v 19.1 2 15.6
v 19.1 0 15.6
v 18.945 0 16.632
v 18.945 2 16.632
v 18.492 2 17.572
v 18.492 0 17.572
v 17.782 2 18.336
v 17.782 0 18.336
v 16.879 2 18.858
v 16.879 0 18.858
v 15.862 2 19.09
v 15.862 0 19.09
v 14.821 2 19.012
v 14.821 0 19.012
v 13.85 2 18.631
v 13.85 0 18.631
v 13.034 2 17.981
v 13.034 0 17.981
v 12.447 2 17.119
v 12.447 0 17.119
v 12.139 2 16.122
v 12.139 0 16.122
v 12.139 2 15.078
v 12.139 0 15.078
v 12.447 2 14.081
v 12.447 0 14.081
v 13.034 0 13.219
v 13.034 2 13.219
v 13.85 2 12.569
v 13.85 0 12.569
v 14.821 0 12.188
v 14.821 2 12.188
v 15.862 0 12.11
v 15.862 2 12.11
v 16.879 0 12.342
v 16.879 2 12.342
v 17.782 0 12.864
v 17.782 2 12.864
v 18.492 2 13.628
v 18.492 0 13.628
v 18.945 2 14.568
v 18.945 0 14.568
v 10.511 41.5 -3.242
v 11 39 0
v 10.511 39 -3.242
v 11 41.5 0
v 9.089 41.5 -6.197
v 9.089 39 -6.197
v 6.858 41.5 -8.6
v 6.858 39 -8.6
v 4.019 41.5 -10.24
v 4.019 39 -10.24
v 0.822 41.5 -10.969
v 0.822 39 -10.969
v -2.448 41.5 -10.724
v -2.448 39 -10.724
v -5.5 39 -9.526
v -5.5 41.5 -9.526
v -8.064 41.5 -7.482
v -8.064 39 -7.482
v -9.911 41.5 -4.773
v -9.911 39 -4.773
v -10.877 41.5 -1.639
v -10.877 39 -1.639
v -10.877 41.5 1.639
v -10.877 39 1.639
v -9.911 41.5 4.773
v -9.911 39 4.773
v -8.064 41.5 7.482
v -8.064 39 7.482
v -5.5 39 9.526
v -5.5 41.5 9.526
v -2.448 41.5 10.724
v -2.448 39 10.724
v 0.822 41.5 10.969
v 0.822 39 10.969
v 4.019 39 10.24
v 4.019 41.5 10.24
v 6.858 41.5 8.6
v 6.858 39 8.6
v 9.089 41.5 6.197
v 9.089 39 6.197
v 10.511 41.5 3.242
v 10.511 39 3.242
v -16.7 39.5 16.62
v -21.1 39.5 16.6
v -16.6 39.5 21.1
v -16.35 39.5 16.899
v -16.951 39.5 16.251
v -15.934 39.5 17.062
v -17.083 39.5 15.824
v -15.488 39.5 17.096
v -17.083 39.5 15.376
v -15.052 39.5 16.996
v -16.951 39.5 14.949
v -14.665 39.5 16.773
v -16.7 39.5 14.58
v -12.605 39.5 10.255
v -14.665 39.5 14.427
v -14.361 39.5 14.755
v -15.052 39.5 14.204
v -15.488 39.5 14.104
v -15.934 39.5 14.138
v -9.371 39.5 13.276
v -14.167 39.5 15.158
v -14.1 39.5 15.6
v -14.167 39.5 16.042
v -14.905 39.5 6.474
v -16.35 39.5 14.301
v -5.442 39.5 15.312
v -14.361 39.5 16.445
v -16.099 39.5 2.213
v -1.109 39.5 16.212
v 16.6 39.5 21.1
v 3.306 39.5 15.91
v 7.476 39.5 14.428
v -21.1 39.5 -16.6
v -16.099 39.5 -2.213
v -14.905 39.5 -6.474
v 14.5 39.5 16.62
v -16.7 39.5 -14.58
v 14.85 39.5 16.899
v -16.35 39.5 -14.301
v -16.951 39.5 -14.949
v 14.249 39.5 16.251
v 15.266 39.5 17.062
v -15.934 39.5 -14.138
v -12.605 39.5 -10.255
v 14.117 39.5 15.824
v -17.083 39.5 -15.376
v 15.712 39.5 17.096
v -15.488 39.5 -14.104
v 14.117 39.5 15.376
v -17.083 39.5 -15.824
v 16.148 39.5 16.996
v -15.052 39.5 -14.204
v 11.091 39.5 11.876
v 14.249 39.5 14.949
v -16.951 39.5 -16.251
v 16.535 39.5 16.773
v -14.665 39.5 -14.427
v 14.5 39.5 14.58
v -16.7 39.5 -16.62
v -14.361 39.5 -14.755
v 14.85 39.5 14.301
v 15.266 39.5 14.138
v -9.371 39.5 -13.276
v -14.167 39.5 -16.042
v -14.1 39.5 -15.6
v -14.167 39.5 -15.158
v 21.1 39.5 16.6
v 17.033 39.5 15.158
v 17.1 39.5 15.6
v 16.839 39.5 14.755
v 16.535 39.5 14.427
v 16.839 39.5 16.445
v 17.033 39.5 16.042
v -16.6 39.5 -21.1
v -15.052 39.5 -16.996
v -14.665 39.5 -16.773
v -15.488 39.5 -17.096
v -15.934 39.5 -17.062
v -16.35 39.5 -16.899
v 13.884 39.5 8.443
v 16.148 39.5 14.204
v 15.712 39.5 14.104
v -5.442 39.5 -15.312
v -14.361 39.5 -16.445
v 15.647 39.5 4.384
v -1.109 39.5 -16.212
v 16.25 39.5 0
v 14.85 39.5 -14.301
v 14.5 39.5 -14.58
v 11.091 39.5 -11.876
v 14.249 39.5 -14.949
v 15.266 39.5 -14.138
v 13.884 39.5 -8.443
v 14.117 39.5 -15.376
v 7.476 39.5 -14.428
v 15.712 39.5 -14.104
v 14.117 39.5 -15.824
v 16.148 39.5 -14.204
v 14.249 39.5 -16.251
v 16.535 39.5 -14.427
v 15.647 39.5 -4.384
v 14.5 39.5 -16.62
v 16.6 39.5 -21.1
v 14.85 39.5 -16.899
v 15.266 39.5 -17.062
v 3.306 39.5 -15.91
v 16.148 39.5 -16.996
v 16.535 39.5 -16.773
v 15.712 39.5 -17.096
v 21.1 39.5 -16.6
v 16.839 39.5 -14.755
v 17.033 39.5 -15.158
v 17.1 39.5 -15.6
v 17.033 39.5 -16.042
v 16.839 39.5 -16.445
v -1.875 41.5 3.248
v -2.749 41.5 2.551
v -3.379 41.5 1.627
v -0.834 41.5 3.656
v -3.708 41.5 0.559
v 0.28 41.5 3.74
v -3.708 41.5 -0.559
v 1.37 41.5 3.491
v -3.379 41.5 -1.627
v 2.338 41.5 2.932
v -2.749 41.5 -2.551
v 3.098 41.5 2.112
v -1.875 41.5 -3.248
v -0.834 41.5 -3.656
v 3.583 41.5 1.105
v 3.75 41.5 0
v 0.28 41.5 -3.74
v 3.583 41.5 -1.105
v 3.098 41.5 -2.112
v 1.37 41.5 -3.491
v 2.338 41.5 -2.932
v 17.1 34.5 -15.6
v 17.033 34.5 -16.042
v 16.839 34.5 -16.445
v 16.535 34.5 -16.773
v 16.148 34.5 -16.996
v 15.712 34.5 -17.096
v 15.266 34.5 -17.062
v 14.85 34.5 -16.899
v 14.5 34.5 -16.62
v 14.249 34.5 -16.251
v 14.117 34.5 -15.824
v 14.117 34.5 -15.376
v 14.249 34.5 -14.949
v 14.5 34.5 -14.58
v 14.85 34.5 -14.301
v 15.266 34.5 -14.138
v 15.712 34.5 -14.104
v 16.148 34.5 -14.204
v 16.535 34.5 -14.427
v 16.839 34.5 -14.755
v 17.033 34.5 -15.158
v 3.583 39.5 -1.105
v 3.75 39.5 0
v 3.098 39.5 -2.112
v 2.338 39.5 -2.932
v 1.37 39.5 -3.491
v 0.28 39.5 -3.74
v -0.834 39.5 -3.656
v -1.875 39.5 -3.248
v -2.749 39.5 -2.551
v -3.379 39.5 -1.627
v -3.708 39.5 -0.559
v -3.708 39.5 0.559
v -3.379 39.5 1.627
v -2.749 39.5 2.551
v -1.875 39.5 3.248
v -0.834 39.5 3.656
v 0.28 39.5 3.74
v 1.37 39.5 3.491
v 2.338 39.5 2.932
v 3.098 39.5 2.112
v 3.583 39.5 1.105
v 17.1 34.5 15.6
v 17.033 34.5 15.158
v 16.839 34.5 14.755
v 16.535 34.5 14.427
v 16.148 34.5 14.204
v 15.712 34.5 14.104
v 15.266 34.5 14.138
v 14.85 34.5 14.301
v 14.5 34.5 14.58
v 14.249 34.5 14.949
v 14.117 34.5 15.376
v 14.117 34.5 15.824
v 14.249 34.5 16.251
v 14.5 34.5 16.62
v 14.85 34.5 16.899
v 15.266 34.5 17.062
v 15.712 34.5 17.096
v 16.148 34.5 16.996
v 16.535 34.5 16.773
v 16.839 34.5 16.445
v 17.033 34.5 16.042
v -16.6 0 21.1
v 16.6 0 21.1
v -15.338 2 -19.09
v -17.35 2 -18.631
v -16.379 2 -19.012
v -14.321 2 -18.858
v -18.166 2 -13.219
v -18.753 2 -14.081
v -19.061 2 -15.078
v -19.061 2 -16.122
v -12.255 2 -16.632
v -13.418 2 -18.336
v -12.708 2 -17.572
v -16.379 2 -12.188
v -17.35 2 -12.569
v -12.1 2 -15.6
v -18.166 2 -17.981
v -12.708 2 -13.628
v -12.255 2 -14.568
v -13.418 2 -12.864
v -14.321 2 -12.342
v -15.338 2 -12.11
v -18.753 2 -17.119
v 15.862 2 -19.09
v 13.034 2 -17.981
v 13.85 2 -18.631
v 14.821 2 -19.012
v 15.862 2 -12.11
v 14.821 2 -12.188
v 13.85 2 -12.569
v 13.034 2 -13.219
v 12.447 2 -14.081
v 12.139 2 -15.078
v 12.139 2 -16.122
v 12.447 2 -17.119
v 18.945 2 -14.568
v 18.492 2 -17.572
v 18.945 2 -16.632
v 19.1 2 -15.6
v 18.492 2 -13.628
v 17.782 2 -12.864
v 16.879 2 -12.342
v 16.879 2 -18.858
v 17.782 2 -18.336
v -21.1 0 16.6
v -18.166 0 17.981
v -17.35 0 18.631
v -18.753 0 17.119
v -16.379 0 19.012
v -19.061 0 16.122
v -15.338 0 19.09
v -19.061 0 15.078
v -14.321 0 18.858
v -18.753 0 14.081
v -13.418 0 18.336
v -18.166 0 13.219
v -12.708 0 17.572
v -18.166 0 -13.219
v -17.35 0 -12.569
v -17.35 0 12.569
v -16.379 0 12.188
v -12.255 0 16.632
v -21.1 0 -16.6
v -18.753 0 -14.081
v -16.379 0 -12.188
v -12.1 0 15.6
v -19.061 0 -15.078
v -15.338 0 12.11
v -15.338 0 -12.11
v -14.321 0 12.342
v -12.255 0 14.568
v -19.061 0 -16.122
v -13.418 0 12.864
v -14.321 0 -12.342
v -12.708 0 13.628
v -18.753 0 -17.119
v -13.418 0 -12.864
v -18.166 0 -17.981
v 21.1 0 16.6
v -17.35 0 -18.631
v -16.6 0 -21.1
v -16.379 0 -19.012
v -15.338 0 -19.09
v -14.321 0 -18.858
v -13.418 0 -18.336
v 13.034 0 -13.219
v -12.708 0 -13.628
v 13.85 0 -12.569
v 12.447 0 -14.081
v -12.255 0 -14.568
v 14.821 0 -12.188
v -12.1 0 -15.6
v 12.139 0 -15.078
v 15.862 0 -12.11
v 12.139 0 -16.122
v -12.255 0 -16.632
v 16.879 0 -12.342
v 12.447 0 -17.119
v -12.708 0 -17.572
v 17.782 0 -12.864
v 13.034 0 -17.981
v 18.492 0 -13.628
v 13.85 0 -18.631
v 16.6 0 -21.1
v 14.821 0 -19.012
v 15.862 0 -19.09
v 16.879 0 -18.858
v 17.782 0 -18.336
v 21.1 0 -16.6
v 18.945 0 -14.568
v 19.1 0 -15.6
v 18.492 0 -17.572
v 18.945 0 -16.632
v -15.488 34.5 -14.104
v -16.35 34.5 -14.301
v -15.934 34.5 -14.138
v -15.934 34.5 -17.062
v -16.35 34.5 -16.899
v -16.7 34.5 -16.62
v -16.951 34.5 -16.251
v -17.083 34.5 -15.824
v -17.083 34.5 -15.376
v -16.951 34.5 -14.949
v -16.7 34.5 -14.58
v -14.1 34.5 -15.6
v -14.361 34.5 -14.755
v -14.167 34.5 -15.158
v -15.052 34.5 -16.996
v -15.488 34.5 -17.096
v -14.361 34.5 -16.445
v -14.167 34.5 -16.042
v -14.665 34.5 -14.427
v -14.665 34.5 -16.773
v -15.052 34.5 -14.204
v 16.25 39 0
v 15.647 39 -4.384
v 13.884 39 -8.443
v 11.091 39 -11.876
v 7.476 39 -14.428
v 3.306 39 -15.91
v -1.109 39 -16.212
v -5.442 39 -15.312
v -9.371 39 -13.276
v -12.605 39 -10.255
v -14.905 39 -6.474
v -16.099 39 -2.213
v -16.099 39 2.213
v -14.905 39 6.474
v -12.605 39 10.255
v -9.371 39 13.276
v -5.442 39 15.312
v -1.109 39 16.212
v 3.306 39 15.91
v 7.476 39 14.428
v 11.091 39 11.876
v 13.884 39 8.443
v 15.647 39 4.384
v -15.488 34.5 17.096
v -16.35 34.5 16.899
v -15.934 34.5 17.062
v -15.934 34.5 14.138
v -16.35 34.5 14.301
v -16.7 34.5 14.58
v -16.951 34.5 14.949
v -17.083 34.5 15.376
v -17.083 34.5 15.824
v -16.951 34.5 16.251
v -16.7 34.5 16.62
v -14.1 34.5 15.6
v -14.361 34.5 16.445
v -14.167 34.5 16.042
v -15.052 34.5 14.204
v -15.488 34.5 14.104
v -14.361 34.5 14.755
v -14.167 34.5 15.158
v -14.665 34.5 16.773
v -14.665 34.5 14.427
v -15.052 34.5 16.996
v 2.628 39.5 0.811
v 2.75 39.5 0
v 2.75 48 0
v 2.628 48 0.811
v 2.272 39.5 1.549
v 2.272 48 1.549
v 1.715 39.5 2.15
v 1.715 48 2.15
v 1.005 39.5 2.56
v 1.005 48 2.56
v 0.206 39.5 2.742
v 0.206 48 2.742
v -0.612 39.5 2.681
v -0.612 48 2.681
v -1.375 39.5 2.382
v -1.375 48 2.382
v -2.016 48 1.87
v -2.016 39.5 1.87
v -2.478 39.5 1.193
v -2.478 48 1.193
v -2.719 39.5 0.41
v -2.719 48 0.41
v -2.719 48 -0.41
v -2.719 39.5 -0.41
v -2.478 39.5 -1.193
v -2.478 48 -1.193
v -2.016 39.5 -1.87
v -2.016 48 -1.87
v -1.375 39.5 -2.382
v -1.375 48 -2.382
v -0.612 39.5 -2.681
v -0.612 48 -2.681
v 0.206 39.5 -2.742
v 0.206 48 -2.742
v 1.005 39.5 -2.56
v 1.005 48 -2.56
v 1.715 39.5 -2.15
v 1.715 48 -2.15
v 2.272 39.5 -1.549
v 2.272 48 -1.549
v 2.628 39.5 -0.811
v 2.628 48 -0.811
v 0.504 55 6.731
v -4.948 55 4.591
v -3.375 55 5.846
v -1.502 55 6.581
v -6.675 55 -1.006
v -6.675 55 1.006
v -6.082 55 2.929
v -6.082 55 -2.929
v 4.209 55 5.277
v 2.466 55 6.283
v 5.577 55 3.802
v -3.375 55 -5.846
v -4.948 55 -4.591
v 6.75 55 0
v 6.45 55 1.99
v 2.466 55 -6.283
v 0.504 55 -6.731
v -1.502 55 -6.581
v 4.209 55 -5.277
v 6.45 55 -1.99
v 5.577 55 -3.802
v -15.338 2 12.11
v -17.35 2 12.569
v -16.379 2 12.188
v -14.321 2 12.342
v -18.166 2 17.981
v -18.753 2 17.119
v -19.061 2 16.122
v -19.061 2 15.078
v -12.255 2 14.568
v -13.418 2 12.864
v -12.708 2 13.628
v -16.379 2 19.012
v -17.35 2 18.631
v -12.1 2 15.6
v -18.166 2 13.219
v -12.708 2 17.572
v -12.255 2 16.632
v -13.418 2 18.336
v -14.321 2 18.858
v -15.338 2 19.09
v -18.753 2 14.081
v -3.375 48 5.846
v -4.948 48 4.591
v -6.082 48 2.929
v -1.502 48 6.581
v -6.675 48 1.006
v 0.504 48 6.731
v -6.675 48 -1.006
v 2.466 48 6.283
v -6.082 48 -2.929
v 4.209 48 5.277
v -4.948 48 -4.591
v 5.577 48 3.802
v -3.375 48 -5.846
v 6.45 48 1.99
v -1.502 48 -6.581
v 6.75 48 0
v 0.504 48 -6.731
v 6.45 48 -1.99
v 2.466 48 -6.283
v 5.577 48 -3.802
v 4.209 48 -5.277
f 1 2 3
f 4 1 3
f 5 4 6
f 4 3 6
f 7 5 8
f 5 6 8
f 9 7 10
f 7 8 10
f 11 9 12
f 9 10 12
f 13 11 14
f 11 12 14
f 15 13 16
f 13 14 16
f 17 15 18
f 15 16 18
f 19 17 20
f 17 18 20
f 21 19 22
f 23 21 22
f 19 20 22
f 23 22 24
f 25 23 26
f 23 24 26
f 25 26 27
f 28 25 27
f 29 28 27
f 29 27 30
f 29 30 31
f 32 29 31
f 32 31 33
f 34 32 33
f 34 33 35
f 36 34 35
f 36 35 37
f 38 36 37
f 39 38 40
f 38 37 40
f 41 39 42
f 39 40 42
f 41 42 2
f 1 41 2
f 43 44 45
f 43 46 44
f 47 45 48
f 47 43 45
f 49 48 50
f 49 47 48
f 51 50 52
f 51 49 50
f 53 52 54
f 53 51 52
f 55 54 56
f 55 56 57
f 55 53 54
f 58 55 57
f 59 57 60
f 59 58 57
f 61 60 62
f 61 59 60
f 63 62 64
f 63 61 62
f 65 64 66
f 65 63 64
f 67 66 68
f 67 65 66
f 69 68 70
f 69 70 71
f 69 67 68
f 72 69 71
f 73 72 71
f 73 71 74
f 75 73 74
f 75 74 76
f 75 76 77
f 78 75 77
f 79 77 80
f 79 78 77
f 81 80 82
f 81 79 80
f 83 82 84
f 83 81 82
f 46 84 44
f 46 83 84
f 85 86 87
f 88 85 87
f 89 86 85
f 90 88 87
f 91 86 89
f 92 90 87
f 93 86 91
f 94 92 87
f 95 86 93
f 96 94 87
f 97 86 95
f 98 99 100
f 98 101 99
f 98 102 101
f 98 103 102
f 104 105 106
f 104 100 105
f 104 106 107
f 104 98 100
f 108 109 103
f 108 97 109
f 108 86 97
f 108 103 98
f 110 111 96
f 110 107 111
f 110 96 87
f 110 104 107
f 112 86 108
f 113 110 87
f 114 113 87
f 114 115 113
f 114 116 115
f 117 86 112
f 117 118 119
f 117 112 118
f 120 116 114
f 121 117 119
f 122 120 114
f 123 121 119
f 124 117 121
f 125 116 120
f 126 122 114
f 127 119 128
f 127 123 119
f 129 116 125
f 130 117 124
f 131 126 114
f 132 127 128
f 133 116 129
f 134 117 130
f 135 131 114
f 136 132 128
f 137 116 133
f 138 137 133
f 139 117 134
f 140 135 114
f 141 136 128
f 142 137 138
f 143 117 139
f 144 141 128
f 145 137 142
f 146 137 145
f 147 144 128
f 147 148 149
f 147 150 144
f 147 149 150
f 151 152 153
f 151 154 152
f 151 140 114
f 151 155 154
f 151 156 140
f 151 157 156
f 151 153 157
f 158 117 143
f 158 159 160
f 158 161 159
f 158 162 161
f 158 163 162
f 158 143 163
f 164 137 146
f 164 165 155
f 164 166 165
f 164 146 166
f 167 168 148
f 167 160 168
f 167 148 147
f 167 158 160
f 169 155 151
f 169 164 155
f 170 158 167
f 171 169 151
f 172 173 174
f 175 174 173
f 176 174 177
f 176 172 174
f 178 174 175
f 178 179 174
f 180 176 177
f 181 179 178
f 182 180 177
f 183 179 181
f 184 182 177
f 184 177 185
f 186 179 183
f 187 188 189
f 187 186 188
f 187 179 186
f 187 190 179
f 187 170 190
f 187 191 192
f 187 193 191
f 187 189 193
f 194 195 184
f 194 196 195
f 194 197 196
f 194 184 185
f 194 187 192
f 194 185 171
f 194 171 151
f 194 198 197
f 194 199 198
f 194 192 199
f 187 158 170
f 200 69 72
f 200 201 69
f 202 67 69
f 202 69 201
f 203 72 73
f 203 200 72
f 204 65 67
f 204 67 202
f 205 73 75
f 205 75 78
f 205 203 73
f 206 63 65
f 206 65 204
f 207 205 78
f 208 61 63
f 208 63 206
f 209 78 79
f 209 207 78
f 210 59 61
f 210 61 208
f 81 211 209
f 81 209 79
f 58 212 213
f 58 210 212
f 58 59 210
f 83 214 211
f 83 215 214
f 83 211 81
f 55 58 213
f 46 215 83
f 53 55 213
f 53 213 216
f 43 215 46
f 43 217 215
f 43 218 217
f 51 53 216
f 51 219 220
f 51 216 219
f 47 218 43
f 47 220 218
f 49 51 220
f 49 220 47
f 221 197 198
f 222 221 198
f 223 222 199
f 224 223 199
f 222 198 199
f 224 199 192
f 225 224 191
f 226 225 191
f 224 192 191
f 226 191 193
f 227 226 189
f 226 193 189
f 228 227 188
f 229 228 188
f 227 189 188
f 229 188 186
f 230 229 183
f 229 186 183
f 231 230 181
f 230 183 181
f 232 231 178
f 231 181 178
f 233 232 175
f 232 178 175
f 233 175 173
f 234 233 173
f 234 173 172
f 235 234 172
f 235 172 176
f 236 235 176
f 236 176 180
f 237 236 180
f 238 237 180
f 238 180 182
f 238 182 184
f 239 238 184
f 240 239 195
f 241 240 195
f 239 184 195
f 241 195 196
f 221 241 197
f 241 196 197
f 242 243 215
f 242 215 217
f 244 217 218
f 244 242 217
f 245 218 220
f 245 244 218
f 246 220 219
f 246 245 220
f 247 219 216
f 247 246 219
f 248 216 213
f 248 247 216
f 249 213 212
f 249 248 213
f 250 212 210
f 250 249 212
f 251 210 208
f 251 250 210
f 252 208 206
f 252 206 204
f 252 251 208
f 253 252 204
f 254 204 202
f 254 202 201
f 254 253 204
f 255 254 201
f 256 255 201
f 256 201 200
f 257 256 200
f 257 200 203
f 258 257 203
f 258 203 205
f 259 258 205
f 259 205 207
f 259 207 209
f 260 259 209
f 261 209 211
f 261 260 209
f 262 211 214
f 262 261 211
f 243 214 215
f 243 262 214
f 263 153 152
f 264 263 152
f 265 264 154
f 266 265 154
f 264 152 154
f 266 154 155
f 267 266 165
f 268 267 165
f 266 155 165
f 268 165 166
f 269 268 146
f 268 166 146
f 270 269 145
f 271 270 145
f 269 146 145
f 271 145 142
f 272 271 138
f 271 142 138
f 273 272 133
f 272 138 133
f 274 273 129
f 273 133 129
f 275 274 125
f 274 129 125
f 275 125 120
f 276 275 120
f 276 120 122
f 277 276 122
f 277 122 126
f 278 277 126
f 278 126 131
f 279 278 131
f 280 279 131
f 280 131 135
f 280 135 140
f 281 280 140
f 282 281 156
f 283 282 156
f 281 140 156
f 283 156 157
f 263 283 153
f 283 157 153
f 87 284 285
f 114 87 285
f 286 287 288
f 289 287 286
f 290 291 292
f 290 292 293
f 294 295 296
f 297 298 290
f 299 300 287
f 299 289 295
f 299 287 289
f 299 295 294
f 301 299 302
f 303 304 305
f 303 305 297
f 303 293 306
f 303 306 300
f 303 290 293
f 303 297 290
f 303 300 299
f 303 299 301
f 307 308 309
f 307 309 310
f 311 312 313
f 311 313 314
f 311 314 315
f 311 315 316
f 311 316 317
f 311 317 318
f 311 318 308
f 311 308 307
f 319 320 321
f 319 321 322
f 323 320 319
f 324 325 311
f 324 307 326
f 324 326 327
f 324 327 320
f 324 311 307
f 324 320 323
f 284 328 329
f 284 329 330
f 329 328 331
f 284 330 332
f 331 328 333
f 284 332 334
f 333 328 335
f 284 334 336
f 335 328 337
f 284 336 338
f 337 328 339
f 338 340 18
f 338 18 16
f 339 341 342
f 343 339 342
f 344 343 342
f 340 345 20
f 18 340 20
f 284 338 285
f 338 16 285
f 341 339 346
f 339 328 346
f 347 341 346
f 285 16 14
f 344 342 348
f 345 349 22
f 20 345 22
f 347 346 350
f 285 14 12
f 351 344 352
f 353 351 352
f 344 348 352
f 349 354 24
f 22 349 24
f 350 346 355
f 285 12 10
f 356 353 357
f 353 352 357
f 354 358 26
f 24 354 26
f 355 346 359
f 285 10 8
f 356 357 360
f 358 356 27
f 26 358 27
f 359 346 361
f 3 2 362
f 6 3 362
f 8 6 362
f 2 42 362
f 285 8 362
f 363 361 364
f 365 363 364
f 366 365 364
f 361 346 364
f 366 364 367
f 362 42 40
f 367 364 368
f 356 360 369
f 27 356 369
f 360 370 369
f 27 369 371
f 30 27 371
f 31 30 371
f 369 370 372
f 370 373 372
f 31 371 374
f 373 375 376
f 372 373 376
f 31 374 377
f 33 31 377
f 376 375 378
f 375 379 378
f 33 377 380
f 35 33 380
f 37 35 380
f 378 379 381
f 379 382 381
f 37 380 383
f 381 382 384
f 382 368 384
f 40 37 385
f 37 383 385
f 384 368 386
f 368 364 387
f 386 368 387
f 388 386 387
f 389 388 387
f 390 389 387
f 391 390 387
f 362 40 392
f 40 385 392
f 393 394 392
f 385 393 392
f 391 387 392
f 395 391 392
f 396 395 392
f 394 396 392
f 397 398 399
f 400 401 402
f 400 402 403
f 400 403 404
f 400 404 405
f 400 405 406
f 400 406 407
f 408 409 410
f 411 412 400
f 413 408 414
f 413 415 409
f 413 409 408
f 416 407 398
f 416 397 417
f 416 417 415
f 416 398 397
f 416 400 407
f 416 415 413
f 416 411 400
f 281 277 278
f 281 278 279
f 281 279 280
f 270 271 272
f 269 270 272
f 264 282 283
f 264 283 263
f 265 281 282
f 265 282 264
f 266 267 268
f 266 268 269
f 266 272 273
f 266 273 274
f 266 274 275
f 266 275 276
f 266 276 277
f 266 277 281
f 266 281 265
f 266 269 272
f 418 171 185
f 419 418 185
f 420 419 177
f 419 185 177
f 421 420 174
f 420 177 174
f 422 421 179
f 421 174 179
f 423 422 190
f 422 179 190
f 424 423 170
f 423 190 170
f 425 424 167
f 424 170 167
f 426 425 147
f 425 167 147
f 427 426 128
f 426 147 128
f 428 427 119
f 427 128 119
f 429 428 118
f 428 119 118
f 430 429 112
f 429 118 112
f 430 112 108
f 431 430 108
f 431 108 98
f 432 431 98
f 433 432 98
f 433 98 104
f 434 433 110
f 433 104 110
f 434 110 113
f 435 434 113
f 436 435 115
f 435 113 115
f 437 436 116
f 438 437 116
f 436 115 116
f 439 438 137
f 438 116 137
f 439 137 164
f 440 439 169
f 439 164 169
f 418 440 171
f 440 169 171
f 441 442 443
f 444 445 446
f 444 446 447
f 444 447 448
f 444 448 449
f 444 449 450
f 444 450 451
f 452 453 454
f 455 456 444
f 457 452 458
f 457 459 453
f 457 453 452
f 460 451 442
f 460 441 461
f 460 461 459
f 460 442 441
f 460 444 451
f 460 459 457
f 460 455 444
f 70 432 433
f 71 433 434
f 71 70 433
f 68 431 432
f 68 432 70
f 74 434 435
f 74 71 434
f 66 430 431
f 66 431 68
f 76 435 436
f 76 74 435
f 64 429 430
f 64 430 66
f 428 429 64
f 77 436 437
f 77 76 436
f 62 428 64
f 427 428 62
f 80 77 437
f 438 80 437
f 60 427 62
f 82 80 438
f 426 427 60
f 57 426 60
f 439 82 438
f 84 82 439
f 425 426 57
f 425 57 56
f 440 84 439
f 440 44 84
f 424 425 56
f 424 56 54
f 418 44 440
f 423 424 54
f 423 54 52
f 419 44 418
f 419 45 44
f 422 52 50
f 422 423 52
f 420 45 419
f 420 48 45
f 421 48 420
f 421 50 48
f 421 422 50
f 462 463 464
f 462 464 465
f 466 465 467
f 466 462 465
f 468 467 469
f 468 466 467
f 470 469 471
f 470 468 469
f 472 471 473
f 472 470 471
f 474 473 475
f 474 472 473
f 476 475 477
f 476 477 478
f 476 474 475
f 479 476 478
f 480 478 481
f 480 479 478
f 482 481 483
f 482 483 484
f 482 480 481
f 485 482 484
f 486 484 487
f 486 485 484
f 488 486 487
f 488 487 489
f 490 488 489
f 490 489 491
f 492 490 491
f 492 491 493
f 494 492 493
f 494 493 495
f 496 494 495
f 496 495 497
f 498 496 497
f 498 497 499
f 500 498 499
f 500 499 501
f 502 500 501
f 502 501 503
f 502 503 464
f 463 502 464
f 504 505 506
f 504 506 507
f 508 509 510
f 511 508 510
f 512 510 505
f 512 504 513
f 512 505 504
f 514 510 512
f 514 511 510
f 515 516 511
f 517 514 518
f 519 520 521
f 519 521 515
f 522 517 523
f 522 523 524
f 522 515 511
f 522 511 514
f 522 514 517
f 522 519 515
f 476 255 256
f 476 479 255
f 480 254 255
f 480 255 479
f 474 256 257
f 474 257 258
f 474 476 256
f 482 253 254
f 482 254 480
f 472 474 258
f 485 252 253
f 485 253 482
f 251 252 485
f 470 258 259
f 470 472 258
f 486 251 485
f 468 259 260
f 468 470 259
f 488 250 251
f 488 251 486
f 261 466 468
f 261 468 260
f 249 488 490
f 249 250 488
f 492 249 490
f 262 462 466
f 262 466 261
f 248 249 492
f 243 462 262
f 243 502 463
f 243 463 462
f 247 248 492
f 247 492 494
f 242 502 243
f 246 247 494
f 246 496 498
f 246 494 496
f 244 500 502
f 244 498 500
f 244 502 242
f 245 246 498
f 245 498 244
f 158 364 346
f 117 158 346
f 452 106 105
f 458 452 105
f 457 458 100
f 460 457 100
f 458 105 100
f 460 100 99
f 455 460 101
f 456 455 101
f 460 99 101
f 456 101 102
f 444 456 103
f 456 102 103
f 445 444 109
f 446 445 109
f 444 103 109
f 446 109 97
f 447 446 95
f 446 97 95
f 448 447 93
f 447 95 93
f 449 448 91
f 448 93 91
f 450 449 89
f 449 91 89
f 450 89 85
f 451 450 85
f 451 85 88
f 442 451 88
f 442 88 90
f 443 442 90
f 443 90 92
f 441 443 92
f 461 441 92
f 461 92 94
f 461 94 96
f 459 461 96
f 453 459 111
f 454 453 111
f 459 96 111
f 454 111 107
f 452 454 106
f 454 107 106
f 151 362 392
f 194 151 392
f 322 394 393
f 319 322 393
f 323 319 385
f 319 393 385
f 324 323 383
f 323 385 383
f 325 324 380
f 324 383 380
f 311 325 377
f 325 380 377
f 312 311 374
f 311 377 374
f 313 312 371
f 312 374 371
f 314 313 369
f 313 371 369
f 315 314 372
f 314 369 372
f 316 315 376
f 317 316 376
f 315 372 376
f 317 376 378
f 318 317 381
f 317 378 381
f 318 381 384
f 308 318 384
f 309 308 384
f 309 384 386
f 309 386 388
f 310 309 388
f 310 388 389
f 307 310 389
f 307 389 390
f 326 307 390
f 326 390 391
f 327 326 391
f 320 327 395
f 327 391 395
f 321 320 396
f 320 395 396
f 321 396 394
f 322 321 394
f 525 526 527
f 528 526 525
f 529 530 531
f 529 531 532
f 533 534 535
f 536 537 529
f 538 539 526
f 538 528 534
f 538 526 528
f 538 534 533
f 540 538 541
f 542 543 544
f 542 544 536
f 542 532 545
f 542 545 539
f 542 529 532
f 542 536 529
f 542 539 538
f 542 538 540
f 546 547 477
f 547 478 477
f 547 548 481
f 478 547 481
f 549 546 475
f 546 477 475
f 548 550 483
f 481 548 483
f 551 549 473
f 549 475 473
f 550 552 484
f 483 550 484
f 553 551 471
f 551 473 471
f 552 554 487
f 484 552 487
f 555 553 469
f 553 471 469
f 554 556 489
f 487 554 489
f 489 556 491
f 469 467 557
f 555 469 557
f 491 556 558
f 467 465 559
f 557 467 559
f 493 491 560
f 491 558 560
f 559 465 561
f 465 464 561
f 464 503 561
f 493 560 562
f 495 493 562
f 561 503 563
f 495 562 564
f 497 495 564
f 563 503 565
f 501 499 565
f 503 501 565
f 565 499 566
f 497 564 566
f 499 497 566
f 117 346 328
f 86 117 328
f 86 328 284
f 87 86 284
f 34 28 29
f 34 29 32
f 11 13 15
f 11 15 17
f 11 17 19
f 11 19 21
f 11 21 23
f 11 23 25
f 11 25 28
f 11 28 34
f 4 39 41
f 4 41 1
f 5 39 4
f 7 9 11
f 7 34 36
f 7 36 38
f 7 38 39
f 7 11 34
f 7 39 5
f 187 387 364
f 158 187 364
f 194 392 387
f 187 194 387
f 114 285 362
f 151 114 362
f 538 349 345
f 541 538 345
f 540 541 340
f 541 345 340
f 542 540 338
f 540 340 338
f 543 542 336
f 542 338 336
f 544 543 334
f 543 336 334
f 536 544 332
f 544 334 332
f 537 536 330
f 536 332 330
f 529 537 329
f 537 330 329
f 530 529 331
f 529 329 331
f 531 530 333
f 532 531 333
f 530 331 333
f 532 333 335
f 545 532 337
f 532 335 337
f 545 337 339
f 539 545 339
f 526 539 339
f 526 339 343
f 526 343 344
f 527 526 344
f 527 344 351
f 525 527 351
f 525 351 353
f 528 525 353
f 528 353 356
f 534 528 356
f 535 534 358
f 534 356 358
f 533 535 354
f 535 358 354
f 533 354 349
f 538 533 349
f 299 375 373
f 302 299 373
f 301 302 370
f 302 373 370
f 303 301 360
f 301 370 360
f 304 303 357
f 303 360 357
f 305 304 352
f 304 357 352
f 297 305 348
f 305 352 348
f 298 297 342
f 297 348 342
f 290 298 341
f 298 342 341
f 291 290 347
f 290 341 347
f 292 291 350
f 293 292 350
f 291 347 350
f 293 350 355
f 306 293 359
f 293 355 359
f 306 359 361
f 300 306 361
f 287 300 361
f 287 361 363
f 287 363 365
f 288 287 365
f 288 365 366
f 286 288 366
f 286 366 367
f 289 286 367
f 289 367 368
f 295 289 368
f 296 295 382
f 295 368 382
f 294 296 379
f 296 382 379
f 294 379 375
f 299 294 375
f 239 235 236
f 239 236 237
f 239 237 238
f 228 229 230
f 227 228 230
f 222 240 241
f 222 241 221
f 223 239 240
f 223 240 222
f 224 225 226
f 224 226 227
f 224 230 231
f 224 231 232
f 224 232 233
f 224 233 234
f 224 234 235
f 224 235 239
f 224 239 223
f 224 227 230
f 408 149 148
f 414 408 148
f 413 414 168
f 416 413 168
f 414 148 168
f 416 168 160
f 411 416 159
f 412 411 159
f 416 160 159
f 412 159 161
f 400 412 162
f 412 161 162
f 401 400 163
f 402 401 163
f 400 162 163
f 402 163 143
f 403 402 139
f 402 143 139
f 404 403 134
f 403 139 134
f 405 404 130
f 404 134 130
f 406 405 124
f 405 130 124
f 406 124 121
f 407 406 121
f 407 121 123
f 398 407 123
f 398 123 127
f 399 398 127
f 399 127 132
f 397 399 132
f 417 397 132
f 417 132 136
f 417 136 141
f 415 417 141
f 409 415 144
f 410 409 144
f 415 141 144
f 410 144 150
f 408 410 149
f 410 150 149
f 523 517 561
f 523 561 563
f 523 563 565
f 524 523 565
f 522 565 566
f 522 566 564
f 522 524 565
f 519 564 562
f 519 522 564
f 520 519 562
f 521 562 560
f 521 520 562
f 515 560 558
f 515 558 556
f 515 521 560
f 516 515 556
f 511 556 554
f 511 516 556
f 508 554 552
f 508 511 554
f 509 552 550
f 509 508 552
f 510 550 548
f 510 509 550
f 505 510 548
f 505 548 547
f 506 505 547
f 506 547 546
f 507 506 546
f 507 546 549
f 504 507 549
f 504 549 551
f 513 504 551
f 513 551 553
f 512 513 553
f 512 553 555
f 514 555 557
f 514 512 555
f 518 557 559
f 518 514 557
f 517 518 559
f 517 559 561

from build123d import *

# Parameters (mm, degrees)
SALIENTE_EXTRUIR1_DEPTH = 39.5
CROQUIS2_R              = 11
CROQUIS2_R_2            = 3.75
SALIENTE_EXTRUIR2_DEPTH = 2
CROQUIS3_R              = 16.25
CROQUIS3_R_2            = 11
CORTAR_EXTRUIR2_DEPTH   = 0.5
CROQUIS4_R              = 2.75
EJE_DEPTH               = 42.5
CROQUIS5_R              = 3.5
PERNOSATRAS_DEPTH       = 2
CROQUIS6_R              = 1.5
PERNOSFRENTE_DEPTH      = 5
CROQUIS7_R              = 2.75
SALIENTE_EXTRUIR3_DEPTH = 55
CROQUIS8_R              = 6.75
SALIENTE_EXTRUIR4_DEPTH = 7


with BuildPart() as part:
    # Croquis1 → Saliente-Extruir1 (new body)
    with BuildSketch(Plane(origin=(0, 0, 0), x_dir=(1, 0, 0), z_dir=(0, 1, 0))):
        Polygon((-16.6, 21.1), (-21.1, 16.6), (-21.1, -16.6), (-16.6, -21.1), (16.6, -21.1), (21.1, -16.6), (21.1, 16.6), (16.6, 21.1), align=None)
    extrude(amount=SALIENTE_EXTRUIR1_DEPTH)

    # Croquis2 → Saliente-Extruir2 (add)
    with BuildSketch(Plane(origin=(0, 39.5, 0), x_dir=(1, 0, 0), z_dir=(0, 1, 0))):
        Circle(CROQUIS2_R)
        Circle(CROQUIS2_R_2, mode=Mode.SUBTRACT)
    extrude(amount=SALIENTE_EXTRUIR2_DEPTH)

    # Croquis3 → Cortar-Extruir2 (cut)
    with BuildSketch(Plane(origin=(0, 39.5, 0), x_dir=(1, 0, 0), z_dir=(0, 1, 0))):
        Circle(CROQUIS3_R)
        Circle(CROQUIS3_R_2, mode=Mode.SUBTRACT)
    extrude(amount=-CORTAR_EXTRUIR2_DEPTH, mode=Mode.SUBTRACT)

    # Croquis4 → EJE (cut, through all)
    with BuildSketch(Plane(origin=(0, 41.5, 0), x_dir=(1, 0, 0), z_dir=(0, 1, 0))):
        Circle(CROQUIS4_R)
    extrude(amount=-EJE_DEPTH, mode=Mode.SUBTRACT)

    # Croquis5 → PernosAtras (cut)
    with BuildSketch(Plane.XZ):
        with Locations((-15.6, 15.6)):
            Circle(CROQUIS5_R)
        with Locations((15.6, 15.6)):
            Circle(CROQUIS5_R)
        with Locations((15.6, -15.6)):
            Circle(CROQUIS5_R)
        with Locations((-15.6, -15.6)):
            Circle(CROQUIS5_R)
    extrude(amount=-PERNOSATRAS_DEPTH, mode=Mode.SUBTRACT)

    # Croquis6 → PernosFrente (cut)
    with BuildSketch(Plane(origin=(0, 39.5, 0), x_dir=(1, 0, 0), z_dir=(0, 1, 0))):
        with Locations((-15.6, 15.6)):
            Circle(CROQUIS6_R)
        with Locations((15.6, 15.6)):
            Circle(CROQUIS6_R)
        with Locations((15.6, -15.6)):
            Circle(CROQUIS6_R)
        with Locations((-15.6, -15.6)):
            Circle(CROQUIS6_R)
    extrude(amount=-PERNOSFRENTE_DEPTH, mode=Mode.SUBTRACT)

    # Croquis7 → Saliente-Extruir3 (add)
    with BuildSketch(Plane.XZ):
        Circle(CROQUIS7_R)
    extrude(amount=-SALIENTE_EXTRUIR3_DEPTH)

    # Croquis8 → Saliente-Extruir4 (add)
    with BuildSketch(Plane(origin=(0, 55, 0), x_dir=(1, 0, 0), z_dir=(0, 1, 0))):
        Circle(CROQUIS8_R)
    extrude(amount=-SALIENTE_EXTRUIR4_DEPTH)


solid = part.part
